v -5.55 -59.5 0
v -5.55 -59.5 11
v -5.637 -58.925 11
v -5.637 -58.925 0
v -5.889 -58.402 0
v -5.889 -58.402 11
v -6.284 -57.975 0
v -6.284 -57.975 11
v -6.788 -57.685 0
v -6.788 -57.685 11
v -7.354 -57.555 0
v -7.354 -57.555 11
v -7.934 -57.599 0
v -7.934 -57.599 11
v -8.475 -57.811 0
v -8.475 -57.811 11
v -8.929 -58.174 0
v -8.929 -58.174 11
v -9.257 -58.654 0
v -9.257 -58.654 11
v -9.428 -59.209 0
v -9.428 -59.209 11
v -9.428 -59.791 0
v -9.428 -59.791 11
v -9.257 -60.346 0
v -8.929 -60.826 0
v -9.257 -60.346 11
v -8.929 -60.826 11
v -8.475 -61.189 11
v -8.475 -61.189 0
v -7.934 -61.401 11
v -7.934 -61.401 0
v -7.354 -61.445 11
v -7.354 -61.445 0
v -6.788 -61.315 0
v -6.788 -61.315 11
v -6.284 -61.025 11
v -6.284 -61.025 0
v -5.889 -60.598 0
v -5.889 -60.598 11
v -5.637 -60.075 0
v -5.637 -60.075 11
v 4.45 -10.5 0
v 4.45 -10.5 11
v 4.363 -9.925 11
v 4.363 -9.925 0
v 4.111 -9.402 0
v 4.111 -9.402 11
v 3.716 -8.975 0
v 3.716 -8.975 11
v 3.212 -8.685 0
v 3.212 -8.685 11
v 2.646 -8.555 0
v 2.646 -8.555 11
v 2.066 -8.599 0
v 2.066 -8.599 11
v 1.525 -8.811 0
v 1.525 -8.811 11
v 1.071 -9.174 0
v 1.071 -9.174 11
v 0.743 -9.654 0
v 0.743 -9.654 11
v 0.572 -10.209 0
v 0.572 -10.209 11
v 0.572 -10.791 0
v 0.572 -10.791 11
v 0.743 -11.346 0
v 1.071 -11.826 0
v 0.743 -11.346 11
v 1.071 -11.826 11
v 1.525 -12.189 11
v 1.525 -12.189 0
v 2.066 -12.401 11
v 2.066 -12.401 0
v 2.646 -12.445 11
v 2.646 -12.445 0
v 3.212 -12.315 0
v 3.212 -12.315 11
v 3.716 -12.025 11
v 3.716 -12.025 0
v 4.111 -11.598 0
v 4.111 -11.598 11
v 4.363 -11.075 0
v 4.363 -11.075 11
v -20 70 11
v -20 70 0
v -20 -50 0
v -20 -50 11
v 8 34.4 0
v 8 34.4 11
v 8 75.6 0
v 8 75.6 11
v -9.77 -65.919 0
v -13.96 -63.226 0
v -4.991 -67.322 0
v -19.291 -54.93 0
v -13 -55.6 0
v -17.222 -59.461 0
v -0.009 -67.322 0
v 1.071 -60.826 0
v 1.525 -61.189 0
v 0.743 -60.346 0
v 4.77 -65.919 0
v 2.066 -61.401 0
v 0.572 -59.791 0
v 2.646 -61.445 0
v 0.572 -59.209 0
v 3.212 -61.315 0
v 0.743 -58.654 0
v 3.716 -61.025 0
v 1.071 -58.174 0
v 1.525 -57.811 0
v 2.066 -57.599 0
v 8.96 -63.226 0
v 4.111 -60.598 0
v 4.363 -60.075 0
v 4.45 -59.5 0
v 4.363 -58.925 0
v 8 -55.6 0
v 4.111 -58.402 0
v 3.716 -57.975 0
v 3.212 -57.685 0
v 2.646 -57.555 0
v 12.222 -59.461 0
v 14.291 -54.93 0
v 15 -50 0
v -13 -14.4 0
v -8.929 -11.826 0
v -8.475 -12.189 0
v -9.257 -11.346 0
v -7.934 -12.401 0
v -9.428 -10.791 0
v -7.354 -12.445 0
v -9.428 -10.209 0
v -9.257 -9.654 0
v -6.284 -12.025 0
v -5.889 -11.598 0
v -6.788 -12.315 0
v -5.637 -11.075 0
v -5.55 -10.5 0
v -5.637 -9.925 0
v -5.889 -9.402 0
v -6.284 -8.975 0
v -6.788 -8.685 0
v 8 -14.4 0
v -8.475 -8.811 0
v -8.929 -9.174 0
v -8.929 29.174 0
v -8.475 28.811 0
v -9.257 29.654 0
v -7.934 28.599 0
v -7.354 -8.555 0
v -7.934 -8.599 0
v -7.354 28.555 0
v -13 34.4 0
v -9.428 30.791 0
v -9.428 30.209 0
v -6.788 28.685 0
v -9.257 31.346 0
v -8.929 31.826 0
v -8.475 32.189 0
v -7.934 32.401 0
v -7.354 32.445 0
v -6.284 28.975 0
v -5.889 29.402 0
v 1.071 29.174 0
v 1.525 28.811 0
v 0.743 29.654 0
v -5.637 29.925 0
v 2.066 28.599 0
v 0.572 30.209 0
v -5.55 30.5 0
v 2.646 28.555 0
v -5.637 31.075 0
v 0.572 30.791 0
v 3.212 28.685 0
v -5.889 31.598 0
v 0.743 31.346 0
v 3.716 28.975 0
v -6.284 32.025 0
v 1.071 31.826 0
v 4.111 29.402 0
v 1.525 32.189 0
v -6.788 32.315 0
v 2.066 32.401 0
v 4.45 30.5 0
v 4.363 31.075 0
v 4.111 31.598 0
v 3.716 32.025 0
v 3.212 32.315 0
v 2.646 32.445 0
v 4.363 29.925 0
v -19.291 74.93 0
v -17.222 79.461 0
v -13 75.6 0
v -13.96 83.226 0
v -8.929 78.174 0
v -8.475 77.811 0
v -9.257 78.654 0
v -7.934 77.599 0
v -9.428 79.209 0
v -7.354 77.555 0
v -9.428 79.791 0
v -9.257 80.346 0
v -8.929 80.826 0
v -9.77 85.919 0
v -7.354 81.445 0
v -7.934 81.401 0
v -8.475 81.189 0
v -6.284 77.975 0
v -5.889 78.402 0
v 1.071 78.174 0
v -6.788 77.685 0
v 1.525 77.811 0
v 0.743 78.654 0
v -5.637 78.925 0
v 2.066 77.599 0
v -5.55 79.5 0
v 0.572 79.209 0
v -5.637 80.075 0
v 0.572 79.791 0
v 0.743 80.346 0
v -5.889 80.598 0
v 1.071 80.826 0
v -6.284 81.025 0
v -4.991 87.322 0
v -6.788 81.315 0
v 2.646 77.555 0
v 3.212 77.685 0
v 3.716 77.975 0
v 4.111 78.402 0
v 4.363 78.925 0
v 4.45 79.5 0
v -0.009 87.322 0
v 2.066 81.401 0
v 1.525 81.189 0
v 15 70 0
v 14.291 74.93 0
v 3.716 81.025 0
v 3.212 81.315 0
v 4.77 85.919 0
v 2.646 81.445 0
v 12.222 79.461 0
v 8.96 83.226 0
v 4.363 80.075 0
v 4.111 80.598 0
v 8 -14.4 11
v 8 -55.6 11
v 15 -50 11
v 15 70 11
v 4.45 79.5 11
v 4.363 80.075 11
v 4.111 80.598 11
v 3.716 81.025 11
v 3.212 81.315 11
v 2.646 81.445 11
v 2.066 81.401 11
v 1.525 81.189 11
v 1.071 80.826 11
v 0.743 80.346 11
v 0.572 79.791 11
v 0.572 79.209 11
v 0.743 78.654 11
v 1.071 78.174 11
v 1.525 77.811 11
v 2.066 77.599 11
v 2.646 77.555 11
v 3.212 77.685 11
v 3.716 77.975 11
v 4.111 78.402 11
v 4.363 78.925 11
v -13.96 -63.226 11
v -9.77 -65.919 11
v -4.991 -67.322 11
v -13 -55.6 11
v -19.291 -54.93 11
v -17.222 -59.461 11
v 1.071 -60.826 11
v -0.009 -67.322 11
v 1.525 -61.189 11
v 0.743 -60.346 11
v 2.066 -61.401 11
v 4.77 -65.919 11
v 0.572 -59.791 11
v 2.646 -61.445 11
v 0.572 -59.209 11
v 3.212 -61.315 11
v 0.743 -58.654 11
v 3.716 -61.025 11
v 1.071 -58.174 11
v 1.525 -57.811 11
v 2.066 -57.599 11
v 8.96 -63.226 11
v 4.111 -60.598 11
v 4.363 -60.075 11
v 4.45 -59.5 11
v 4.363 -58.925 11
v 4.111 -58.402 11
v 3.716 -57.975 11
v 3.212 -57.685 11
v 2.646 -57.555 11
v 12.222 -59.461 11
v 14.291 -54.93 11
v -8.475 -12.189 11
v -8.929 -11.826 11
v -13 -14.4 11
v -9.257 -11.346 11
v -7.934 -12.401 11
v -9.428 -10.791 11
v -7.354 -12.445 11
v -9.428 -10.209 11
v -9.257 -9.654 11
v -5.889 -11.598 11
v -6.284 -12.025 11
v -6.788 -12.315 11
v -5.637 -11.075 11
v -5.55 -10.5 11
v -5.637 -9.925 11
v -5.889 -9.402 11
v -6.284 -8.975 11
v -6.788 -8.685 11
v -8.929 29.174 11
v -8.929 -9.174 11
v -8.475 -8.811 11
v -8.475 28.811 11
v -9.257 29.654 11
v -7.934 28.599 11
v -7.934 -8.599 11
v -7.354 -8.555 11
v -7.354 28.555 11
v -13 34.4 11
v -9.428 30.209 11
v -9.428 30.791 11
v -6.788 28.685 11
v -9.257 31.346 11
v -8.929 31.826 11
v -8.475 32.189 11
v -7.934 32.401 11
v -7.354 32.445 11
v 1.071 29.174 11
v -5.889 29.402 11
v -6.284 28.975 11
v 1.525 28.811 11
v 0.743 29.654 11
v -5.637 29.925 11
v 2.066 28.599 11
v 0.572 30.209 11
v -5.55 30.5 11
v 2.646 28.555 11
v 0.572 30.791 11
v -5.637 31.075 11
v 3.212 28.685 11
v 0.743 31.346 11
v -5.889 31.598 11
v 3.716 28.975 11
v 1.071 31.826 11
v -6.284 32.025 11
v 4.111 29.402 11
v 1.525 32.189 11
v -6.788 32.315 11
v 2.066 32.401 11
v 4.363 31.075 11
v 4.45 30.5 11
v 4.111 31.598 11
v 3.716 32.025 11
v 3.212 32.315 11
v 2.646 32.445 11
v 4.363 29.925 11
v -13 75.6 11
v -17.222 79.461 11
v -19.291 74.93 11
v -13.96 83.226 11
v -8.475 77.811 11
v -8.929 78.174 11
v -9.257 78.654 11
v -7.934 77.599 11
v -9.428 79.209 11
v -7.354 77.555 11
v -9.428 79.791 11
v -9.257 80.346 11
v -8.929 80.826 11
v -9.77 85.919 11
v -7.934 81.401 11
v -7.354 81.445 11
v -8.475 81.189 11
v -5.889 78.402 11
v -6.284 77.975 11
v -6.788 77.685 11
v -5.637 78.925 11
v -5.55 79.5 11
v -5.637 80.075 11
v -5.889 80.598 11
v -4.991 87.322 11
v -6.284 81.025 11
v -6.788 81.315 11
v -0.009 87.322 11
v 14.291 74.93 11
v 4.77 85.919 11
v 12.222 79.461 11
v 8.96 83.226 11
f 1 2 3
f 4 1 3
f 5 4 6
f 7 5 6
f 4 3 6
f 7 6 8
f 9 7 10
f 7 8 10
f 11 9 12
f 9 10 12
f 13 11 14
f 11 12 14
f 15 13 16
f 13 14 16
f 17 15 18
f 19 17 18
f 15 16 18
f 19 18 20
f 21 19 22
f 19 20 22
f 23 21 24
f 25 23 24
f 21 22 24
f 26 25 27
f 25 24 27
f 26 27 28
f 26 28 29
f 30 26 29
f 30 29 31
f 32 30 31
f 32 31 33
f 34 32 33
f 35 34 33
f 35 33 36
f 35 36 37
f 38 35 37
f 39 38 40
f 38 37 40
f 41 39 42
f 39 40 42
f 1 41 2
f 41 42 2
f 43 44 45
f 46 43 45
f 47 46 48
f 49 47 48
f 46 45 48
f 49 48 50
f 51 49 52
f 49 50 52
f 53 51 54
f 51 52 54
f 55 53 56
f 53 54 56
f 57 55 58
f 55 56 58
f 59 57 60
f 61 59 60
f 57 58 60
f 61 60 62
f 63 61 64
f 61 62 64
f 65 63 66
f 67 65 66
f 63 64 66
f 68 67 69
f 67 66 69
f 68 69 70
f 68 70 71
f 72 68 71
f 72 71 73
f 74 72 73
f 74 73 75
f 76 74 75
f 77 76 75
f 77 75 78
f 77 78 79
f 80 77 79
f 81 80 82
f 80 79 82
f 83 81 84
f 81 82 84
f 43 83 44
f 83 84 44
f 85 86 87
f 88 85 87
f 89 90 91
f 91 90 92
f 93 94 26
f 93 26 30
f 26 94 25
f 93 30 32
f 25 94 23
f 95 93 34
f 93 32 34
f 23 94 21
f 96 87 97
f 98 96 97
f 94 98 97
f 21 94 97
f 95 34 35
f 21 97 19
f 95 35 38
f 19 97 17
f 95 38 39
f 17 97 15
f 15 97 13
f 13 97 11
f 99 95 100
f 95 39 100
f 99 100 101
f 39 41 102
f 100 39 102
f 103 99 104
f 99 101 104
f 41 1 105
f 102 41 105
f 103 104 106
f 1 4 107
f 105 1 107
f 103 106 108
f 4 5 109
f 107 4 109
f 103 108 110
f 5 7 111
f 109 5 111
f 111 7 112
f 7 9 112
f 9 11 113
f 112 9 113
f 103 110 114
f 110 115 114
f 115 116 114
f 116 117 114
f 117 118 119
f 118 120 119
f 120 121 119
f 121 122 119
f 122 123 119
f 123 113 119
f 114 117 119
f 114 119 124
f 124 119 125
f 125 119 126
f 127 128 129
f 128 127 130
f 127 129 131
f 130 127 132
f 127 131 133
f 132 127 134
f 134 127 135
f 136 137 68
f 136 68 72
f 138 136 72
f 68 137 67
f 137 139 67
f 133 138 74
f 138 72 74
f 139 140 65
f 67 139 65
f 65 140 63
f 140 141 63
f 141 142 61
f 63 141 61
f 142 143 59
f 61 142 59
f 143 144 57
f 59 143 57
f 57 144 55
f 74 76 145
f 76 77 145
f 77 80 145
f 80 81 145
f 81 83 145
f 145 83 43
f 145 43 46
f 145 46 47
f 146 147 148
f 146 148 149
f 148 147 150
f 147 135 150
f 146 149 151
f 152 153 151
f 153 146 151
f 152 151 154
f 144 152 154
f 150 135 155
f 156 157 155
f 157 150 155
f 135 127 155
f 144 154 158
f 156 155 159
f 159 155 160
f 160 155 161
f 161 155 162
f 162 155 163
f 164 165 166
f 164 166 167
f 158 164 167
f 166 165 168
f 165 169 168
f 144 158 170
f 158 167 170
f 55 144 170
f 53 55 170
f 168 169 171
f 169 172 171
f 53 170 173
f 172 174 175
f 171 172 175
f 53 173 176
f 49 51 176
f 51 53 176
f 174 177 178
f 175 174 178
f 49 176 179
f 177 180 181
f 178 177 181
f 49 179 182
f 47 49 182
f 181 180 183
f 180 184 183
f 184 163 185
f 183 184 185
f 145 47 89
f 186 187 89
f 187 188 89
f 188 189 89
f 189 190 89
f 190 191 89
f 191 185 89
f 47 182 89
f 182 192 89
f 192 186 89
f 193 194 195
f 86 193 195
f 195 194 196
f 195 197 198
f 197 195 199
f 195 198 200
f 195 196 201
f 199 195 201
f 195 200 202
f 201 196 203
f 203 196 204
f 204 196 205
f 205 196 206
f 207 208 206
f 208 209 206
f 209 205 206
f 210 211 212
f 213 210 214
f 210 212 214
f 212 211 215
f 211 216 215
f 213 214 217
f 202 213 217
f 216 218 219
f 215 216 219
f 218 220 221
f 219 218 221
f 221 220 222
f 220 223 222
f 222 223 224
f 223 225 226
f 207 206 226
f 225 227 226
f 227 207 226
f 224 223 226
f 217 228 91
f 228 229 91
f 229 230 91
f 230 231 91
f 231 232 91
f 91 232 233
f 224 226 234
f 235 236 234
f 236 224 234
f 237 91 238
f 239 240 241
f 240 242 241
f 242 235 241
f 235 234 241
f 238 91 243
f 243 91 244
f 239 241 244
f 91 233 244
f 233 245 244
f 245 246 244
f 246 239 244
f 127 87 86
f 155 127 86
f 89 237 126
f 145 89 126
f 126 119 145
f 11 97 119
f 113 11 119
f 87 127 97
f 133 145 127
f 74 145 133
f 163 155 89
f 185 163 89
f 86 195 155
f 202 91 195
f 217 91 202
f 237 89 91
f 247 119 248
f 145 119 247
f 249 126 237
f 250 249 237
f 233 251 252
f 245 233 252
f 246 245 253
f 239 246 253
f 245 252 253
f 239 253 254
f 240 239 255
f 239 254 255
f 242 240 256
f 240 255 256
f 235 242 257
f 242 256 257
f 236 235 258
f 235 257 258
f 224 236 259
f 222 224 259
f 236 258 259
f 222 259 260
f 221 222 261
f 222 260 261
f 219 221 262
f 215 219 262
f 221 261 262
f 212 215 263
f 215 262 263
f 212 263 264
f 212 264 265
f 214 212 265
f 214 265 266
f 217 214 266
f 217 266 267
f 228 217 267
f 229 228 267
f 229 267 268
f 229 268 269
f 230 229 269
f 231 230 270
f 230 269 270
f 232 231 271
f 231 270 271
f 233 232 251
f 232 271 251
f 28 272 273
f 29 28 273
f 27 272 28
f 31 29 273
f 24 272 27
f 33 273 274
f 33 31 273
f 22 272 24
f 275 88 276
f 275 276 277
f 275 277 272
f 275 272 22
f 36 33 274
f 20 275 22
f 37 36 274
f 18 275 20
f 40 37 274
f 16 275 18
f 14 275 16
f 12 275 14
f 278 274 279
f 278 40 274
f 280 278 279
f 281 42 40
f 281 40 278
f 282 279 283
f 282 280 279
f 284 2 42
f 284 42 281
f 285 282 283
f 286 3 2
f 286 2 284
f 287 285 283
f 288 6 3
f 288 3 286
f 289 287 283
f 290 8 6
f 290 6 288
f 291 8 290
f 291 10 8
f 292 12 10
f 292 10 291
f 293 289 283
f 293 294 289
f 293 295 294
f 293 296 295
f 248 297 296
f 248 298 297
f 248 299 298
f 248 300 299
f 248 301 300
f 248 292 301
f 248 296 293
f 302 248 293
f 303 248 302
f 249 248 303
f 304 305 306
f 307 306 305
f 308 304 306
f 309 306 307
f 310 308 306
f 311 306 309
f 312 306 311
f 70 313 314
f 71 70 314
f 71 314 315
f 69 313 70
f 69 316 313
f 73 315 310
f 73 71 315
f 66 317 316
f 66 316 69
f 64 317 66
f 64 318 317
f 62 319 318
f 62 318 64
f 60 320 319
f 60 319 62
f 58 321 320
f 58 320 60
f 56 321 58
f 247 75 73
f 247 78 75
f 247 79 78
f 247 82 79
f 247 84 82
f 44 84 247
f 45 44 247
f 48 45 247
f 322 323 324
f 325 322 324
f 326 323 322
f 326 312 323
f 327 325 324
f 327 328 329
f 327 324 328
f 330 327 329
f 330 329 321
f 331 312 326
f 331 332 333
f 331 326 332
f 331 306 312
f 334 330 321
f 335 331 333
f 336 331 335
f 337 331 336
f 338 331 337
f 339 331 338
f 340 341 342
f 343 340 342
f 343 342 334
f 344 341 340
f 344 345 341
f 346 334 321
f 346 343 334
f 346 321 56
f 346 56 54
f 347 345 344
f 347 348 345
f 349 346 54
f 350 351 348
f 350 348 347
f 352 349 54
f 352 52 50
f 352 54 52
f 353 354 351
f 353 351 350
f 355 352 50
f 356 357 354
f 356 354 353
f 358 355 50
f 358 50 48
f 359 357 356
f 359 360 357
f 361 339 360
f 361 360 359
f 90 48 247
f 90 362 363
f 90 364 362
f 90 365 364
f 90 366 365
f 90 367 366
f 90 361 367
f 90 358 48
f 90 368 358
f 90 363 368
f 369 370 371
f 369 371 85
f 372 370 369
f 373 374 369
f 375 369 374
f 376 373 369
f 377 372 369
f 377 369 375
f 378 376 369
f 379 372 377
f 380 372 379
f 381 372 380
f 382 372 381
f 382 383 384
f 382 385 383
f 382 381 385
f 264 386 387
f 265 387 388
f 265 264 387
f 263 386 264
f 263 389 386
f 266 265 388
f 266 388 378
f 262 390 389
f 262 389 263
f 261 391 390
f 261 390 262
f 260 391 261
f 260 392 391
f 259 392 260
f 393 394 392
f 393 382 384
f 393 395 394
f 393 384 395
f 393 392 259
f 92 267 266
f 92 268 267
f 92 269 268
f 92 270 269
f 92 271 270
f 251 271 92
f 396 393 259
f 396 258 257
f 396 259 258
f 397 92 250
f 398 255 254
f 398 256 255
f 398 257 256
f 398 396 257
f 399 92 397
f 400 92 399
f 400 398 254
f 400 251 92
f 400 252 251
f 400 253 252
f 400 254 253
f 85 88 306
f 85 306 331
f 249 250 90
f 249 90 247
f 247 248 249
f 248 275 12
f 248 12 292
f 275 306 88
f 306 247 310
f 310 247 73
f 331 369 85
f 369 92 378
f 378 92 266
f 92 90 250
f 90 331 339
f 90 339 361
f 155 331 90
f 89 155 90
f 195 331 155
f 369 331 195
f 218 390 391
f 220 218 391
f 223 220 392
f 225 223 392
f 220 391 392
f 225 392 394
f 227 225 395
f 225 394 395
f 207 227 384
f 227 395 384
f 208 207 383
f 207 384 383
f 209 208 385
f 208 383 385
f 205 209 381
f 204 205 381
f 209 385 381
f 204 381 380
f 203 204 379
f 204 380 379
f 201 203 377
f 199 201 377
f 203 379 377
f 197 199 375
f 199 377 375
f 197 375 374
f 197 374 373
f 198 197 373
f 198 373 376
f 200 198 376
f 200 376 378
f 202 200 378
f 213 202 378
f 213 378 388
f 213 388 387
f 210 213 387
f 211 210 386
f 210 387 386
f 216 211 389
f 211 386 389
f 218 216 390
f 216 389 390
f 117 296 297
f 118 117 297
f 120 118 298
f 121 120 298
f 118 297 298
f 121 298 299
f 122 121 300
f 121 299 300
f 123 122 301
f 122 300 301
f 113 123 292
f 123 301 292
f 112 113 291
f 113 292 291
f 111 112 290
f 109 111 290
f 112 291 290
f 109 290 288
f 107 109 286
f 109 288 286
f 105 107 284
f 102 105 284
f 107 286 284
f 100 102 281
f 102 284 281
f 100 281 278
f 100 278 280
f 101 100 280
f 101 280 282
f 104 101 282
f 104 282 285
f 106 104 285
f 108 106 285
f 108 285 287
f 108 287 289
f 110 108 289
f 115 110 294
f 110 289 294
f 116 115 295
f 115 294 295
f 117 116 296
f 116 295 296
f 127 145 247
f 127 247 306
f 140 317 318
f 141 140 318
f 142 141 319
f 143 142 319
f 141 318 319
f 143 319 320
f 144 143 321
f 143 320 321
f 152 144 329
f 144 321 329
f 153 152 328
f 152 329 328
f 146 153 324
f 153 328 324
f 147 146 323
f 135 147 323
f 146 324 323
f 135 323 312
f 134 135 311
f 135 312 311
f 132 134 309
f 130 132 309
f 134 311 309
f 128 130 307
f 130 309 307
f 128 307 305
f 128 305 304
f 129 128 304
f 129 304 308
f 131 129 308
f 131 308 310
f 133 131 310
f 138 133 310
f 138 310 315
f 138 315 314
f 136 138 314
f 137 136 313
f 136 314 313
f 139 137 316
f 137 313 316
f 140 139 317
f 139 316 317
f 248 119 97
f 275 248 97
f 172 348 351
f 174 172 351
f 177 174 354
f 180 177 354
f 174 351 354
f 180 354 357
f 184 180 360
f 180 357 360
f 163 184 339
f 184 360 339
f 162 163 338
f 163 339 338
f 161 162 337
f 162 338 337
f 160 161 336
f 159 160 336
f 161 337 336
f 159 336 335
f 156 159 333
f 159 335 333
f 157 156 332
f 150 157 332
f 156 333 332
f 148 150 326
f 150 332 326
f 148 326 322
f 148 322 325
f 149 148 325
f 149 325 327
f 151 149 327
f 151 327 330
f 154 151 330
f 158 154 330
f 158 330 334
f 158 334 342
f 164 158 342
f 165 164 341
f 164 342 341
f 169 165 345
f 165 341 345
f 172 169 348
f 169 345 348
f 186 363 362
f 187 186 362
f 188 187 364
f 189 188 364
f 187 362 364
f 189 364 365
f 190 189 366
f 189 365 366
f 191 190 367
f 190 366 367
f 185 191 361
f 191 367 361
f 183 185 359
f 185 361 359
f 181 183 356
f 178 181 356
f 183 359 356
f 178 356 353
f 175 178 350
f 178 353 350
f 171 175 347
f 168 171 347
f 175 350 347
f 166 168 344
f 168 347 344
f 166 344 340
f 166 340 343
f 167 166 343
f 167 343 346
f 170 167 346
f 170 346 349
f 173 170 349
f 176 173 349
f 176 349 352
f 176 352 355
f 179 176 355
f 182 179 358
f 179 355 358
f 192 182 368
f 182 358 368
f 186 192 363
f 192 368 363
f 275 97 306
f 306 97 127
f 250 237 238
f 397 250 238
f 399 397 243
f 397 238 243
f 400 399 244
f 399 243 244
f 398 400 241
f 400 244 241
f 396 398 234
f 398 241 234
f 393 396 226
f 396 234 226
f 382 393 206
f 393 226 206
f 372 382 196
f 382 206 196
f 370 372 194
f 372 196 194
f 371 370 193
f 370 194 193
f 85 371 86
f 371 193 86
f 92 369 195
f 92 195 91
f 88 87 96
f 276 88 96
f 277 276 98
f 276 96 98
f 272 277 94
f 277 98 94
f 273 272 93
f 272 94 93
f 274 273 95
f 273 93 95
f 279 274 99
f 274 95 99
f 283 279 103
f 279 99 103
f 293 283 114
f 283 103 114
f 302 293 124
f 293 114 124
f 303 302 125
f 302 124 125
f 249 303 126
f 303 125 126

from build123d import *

# Parameters (mm, degrees)
SKETCH1_R           = 1.6
SKETCH1_W           = 21
SKETCH1_H           = 41
BOSS_EXTRUDE1_DEPTH = 11
SKETCH6_W           = 21
SKETCH6_H           = 0.1
CUT_EXTRUDE1_DEPTH  = 91.428148273
SKETCH7_W           = 21
SKETCH7_H           = 41.2
SKETCH7_R           = 1.6
CUT_EXTRUDE2_DEPTH  = 11
SKETCH8_R           = 1.95
CUT_EXTRUDE3_DEPTH  = 11


with BuildPart() as part:
    # Sketch1 → Boss-Extrude1 (new body)
    with BuildSketch(Plane.XY):
        with BuildLine():
            Line((-20, 70), (-20, -50))
            ThreePointArc((-20, -50), (-2.5, -67.5), (15, -50))
            Line((15, -50), (15, 70))
            ThreePointArc((15, 70), (-2.5, 87.5), (-20, 70))
        make_face()
        with Locations((-7.5, 79.5)):
            Circle(SKETCH1_R, mode=Mode.SUBTRACT)
        with Locations(Location((2.5, 79.5, 0), (0, 0, 180))):
            Circle(SKETCH1_R, mode=Mode.SUBTRACT)
        with Locations((2.5, 30.5)):
            Circle(SKETCH1_R, mode=Mode.SUBTRACT)
        with Locations(Location((-7.5, 30.5, 0), (0, 0, 180))):
            Circle(SKETCH1_R, mode=Mode.SUBTRACT)
        with Locations((-2.5, 55)):
            Rectangle(SKETCH1_W, SKETCH1_H, mode=Mode.SUBTRACT)
    extrude(amount=BOSS_EXTRUDE1_DEPTH)

    # Sketch6 → Cut-Extrude1 (cut, through all)
    with BuildSketch(Plane.XY.offset(11)):
        with Locations((-2.5, 75.55)):
            Rectangle(SKETCH6_W, SKETCH6_H)
        with Locations((-2.5, 34.45)):
            Rectangle(SKETCH6_W, SKETCH6_H)
    extrude(amount=-CUT_EXTRUDE1_DEPTH, mode=Mode.SUBTRACT)

    # Sketch7 → Cut-Extrude2 (cut)
    with BuildSketch(Plane(origin=(0, 0, 0), x_dir=(-1, 0, 0), z_dir=(0, 0, -1))):
        with Locations((2.5, -35)):
            Rectangle(SKETCH7_W, SKETCH7_H)
        with Locations((-2.5, -10.5)):
            Circle(SKETCH7_R)
        with Locations((7.5, -10.5)):
            Circle(SKETCH7_R)
        with Locations((-2.5, -59.5)):
            Circle(SKETCH7_R)
        with Locations((7.5, -59.5)):
            Circle(SKETCH7_R)
    extrude(amount=-CUT_EXTRUDE2_DEPTH, mode=Mode.SUBTRACT)

    # Sketch8 → Cut-Extrude3 (cut)
    with BuildSketch(Plane.XY.offset(11)):
        with Locations((-7.5, 79.5)):
            Circle(SKETCH8_R)
        with Locations((2.5, 79.5)):
            Circle(SKETCH8_R)
        with Locations((2.5, 30.5)):
            Circle(SKETCH8_R)
        with Locations((-7.5, 30.5)):
            Circle(SKETCH8_R)
        with Locations((2.5, -10.5)):
            Circle(SKETCH8_R)
        with Locations((-7.5, -10.5)):
            Circle(SKETCH8_R)
        with Locations((2.5, -59.5)):
            Circle(SKETCH8_R)
        with Locations((-7.5, -59.5)):
            Circle(SKETCH8_R)
    extrude(amount=-CUT_EXTRUDE3_DEPTH, mode=Mode.SUBTRACT)


solid = part.part
